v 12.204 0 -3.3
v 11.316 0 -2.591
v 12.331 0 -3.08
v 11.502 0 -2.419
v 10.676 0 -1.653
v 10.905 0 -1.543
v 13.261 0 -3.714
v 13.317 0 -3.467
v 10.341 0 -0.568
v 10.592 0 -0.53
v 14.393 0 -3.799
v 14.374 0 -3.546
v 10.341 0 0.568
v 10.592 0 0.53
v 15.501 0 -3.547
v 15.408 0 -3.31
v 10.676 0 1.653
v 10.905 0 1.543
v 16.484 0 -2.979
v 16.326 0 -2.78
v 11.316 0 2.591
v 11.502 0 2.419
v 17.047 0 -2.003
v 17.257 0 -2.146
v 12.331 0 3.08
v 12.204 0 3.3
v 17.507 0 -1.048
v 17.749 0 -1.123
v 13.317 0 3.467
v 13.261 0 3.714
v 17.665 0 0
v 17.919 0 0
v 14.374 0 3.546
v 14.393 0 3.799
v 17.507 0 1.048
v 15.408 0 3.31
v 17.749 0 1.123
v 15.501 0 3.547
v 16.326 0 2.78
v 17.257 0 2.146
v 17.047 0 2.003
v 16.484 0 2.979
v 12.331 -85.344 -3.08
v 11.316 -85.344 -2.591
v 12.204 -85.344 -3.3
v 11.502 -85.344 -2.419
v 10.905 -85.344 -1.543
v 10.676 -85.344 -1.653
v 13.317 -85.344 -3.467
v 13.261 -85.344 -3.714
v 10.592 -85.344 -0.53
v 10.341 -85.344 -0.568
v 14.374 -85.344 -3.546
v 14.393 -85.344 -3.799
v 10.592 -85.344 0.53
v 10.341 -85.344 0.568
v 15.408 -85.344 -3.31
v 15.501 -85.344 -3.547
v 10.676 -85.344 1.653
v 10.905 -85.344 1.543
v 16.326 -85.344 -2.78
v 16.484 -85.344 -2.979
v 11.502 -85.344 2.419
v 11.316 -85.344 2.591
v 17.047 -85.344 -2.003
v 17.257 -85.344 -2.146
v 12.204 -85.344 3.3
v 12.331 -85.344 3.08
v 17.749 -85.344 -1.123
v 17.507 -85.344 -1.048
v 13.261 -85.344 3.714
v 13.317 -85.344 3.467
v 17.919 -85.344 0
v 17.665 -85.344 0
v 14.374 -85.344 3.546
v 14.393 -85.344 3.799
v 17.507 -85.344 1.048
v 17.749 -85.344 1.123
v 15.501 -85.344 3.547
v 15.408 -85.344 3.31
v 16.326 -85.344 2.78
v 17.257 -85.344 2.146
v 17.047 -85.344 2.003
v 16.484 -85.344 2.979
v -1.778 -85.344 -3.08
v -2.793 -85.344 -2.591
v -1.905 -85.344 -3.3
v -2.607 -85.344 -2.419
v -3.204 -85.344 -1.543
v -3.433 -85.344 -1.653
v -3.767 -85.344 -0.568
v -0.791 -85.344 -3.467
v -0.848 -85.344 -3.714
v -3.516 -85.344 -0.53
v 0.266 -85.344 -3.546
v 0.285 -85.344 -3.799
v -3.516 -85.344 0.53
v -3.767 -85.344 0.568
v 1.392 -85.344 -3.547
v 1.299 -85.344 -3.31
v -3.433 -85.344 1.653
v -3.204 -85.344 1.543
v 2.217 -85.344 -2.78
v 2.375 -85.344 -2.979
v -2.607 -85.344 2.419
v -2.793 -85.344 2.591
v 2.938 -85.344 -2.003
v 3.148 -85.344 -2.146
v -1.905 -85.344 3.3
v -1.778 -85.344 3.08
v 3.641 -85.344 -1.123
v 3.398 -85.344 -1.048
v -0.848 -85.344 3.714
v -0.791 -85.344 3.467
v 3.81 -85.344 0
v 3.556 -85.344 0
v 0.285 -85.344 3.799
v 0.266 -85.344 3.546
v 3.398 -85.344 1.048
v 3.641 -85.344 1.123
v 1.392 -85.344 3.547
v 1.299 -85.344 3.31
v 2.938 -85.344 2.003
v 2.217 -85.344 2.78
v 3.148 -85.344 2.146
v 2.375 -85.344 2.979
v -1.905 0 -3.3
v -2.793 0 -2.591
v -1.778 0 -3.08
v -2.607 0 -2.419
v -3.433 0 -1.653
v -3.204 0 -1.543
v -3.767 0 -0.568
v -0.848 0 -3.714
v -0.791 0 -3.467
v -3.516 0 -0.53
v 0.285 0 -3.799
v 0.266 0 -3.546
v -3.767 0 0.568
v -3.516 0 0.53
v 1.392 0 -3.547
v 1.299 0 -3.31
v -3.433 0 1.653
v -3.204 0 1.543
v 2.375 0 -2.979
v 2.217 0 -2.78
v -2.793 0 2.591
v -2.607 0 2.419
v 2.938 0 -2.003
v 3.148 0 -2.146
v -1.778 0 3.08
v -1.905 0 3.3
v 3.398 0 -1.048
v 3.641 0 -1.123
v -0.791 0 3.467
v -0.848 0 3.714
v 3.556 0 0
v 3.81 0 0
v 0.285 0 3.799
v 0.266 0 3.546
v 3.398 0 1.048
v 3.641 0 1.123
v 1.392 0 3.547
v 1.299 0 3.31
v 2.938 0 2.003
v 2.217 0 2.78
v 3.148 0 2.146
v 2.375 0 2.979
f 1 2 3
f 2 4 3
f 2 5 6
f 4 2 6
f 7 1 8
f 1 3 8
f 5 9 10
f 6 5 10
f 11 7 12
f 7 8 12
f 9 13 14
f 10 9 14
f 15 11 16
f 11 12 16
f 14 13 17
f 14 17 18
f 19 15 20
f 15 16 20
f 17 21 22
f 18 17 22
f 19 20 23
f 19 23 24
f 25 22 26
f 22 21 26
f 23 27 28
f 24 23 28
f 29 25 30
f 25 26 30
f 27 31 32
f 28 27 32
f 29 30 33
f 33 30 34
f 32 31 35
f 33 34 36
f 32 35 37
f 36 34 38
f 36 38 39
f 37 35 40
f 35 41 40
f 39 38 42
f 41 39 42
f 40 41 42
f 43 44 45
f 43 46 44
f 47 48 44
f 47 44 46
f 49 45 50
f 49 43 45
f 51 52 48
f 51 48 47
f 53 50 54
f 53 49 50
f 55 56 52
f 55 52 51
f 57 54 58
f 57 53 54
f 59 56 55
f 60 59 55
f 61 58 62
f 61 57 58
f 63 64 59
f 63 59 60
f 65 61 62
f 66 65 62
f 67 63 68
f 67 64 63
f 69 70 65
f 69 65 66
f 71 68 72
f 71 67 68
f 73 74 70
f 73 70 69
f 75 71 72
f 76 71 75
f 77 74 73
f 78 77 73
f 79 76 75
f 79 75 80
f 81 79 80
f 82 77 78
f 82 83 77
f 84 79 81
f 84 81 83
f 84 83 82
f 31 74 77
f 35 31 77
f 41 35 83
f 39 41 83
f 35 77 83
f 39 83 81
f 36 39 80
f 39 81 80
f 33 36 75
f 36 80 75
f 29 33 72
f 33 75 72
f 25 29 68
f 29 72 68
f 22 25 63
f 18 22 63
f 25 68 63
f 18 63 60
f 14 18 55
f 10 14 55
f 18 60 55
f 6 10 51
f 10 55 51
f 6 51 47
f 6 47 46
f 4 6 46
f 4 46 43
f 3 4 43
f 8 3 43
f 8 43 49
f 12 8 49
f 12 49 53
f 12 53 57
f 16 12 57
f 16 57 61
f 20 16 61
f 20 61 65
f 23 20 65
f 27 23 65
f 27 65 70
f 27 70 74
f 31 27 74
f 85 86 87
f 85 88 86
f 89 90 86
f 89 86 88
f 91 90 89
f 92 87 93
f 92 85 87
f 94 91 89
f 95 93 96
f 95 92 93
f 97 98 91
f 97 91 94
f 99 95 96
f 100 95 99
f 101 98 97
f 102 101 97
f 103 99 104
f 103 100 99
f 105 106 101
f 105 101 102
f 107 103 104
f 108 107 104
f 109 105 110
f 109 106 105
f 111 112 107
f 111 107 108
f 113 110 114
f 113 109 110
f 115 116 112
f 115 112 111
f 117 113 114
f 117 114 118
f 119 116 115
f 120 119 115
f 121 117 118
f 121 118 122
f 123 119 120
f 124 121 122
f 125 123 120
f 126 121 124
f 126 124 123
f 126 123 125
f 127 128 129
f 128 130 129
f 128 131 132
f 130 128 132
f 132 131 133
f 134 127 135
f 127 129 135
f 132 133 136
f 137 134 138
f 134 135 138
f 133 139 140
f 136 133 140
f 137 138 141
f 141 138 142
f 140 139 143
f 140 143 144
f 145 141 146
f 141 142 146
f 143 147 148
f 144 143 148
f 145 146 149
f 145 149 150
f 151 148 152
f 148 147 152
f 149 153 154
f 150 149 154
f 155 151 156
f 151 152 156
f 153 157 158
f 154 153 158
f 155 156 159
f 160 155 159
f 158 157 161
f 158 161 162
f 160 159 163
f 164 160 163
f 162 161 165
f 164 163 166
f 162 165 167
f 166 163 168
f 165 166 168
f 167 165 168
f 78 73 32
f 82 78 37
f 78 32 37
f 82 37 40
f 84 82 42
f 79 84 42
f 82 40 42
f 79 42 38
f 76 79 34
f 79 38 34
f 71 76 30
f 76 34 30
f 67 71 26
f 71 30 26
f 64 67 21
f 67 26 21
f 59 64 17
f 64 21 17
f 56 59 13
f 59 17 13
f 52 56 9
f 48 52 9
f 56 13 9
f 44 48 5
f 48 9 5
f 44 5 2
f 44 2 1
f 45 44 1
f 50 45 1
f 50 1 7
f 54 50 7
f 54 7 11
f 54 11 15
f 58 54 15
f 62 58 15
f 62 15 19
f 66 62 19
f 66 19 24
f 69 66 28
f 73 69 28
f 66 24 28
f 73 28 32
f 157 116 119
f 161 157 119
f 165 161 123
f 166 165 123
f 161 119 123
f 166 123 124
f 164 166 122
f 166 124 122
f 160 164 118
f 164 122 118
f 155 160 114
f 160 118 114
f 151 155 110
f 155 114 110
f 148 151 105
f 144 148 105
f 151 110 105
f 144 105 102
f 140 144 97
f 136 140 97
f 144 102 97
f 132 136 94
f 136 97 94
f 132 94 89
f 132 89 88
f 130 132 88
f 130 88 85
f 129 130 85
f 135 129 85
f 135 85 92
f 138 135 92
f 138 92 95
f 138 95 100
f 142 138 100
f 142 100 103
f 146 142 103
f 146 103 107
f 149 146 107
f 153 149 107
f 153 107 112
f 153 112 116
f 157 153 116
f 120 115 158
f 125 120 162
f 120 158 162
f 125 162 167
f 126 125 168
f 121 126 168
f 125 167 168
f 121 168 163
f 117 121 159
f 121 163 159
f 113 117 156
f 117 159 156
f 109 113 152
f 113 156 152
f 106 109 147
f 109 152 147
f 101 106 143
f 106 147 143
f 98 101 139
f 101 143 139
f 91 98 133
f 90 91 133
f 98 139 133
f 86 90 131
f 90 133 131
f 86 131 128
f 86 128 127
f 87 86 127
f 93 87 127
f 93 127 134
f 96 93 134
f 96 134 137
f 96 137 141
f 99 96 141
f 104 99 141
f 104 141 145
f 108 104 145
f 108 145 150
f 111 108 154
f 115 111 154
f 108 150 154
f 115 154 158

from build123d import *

# Parameters (mm, degrees)
F0_R     = 3.81
F1_R     = 3.81
F2_DEPTH = 85.344
F4_R     = 3.556
F5_DEPTH = 101.092
F3_R     = 3.556
F6_DEPTH = 100.33


with BuildPart() as f2:
    # F0 (on Front) + F1 (on Front) → F2 (new body)
    with BuildSketch(Plane.XZ):
        Circle(F0_R)
    with BuildSketch(Plane.XZ):
        with Locations((14.108564, 0)):
            Circle(F1_R)
    extrude(amount=F2_DEPTH)

    # F4 (on face) → F5 (cut)
    with BuildSketch(Plane.XZ.offset(85.344)):
        Circle(F4_R)
    extrude(amount=-F5_DEPTH, mode=Mode.SUBTRACT)

    # F3 (on face) → F6 (cut)
    with BuildSketch(Plane.XZ.offset(85.344)):
        with Locations((14.108564, 0)):
            Circle(F3_R)
    extrude(amount=-F6_DEPTH, mode=Mode.SUBTRACT)


solid = f2.part
